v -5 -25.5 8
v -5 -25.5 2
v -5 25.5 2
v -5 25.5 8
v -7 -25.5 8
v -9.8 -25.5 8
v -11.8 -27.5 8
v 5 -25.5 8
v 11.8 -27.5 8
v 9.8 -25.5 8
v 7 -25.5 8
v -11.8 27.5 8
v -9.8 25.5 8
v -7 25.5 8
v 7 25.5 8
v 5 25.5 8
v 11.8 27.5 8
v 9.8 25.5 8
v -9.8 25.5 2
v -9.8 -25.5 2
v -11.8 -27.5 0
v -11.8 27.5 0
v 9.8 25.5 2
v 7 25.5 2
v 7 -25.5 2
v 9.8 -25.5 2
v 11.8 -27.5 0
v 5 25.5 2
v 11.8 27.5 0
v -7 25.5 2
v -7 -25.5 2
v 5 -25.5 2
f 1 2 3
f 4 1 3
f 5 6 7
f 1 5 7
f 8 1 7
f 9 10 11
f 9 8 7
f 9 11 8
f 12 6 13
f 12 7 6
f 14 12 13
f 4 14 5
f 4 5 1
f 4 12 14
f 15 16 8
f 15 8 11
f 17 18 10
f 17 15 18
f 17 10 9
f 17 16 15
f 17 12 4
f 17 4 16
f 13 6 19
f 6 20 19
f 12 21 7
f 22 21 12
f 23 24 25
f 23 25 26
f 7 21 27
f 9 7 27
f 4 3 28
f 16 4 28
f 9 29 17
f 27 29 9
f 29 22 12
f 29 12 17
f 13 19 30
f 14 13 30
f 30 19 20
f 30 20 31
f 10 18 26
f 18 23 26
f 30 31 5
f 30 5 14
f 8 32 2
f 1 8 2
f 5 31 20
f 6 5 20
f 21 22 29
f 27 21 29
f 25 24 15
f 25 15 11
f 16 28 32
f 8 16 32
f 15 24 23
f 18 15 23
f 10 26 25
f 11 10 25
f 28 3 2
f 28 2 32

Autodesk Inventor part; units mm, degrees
ref_plane "YZ Plane" through (0, 0, 0) normal (1, 0, 0) x (0, 1, 0)
ref_plane "XZ Plane" through (0, 0, 0) normal (0, 1, 0) x (-1, 0, 0)
ref_plane "XY Plane" through (0, 0, 0) normal (0, 0, 1) x (1, 0, 0)
sketch "Sketch1" plane through (0, 0, 0) normal (0, 0, 1) x (1, 0, 0)
  line L0 (0, 25.5) -> (5, 25.5)
  line L1 (5, 25.5) -> (5, -25.5)
  line L2 (5, -25.5) -> (0, -25.5)
  line L3 (0, -25.5) -> (0, 25.5)
  line L4 (5, 25.5) -> (7, 25.5)
  line L5 (7, 25.5) -> (7, -25.5)
  line L6 (7, -25.5) -> (5, -25.5)
  line L7 (5, -25.5) -> (5, 25.5)
  line L8 (7, 25.5) -> (9.8, 25.5)
  line L9 (9.8, 25.5) -> (9.8, -25.5)
  line L10 (9.8, -25.5) -> (7, -25.5)
  line L11 (7, -25.5) -> (7, 25.5)
  line L12 (9.8, -25.5) -> (11.8, -25.5)
  line L13 (11.8, -25.5) -> (11.8, 25.5)
  line L14 (11.8, 25.5) -> (9.8, 25.5)
  line L15 (9.8, 25.5) -> (9.8, -25.5)
  line L16 (0, 42.6516) -> (0, -39.217) construction
  line L17 (11.8, 25.5) -> (0, 25.5)
  line L18 (0, 25.5) -> (0, 27.5)
  line L19 (0, 27.5) -> (11.8, 27.5)
  line L20 (11.8, 27.5) -> (11.8, 25.5)
  line L21 (11.8, -25.5) -> (0, -25.5)
  line L22 (0, -25.5) -> (0, -27.5)
  line L23 (0, -27.5) -> (11.8, -27.5)
  line L24 (11.8, -27.5) -> (11.8, -25.5)
  point P0 (0, 0)
  point P1 (0, 0)
  dimension "d0" = 2
  dimension "d1" = 51
  dimension "d2" = 2.8
  dimension "d3" = 2
  dimension "d4" = 5
  dimension "d9" = 2
  dimension "d10" = 2
extrude "Extrusion1" add sketch "Sketch1" along normal blind 2 contours L0 L1 L2 L3 | L4 L5 L6 L1 | L8 L9 L10 L5 | L14 L13 L12 L9
extrude "Extrusion2" add sketch "Sketch1" along normal blind 8 contours L18 L19 L20 L14 L8 L4 L0 | L4 L5 L6 L1 | L2 L6 L10 L12 L24 L23 L22 | L14 L13 L12 L9
mirror "Mirror1" about plane through (0, 0, 0) normal (1, 0, 0) of "Extrusion1", "Extrusion2"
properties part number "BasicConnector"
